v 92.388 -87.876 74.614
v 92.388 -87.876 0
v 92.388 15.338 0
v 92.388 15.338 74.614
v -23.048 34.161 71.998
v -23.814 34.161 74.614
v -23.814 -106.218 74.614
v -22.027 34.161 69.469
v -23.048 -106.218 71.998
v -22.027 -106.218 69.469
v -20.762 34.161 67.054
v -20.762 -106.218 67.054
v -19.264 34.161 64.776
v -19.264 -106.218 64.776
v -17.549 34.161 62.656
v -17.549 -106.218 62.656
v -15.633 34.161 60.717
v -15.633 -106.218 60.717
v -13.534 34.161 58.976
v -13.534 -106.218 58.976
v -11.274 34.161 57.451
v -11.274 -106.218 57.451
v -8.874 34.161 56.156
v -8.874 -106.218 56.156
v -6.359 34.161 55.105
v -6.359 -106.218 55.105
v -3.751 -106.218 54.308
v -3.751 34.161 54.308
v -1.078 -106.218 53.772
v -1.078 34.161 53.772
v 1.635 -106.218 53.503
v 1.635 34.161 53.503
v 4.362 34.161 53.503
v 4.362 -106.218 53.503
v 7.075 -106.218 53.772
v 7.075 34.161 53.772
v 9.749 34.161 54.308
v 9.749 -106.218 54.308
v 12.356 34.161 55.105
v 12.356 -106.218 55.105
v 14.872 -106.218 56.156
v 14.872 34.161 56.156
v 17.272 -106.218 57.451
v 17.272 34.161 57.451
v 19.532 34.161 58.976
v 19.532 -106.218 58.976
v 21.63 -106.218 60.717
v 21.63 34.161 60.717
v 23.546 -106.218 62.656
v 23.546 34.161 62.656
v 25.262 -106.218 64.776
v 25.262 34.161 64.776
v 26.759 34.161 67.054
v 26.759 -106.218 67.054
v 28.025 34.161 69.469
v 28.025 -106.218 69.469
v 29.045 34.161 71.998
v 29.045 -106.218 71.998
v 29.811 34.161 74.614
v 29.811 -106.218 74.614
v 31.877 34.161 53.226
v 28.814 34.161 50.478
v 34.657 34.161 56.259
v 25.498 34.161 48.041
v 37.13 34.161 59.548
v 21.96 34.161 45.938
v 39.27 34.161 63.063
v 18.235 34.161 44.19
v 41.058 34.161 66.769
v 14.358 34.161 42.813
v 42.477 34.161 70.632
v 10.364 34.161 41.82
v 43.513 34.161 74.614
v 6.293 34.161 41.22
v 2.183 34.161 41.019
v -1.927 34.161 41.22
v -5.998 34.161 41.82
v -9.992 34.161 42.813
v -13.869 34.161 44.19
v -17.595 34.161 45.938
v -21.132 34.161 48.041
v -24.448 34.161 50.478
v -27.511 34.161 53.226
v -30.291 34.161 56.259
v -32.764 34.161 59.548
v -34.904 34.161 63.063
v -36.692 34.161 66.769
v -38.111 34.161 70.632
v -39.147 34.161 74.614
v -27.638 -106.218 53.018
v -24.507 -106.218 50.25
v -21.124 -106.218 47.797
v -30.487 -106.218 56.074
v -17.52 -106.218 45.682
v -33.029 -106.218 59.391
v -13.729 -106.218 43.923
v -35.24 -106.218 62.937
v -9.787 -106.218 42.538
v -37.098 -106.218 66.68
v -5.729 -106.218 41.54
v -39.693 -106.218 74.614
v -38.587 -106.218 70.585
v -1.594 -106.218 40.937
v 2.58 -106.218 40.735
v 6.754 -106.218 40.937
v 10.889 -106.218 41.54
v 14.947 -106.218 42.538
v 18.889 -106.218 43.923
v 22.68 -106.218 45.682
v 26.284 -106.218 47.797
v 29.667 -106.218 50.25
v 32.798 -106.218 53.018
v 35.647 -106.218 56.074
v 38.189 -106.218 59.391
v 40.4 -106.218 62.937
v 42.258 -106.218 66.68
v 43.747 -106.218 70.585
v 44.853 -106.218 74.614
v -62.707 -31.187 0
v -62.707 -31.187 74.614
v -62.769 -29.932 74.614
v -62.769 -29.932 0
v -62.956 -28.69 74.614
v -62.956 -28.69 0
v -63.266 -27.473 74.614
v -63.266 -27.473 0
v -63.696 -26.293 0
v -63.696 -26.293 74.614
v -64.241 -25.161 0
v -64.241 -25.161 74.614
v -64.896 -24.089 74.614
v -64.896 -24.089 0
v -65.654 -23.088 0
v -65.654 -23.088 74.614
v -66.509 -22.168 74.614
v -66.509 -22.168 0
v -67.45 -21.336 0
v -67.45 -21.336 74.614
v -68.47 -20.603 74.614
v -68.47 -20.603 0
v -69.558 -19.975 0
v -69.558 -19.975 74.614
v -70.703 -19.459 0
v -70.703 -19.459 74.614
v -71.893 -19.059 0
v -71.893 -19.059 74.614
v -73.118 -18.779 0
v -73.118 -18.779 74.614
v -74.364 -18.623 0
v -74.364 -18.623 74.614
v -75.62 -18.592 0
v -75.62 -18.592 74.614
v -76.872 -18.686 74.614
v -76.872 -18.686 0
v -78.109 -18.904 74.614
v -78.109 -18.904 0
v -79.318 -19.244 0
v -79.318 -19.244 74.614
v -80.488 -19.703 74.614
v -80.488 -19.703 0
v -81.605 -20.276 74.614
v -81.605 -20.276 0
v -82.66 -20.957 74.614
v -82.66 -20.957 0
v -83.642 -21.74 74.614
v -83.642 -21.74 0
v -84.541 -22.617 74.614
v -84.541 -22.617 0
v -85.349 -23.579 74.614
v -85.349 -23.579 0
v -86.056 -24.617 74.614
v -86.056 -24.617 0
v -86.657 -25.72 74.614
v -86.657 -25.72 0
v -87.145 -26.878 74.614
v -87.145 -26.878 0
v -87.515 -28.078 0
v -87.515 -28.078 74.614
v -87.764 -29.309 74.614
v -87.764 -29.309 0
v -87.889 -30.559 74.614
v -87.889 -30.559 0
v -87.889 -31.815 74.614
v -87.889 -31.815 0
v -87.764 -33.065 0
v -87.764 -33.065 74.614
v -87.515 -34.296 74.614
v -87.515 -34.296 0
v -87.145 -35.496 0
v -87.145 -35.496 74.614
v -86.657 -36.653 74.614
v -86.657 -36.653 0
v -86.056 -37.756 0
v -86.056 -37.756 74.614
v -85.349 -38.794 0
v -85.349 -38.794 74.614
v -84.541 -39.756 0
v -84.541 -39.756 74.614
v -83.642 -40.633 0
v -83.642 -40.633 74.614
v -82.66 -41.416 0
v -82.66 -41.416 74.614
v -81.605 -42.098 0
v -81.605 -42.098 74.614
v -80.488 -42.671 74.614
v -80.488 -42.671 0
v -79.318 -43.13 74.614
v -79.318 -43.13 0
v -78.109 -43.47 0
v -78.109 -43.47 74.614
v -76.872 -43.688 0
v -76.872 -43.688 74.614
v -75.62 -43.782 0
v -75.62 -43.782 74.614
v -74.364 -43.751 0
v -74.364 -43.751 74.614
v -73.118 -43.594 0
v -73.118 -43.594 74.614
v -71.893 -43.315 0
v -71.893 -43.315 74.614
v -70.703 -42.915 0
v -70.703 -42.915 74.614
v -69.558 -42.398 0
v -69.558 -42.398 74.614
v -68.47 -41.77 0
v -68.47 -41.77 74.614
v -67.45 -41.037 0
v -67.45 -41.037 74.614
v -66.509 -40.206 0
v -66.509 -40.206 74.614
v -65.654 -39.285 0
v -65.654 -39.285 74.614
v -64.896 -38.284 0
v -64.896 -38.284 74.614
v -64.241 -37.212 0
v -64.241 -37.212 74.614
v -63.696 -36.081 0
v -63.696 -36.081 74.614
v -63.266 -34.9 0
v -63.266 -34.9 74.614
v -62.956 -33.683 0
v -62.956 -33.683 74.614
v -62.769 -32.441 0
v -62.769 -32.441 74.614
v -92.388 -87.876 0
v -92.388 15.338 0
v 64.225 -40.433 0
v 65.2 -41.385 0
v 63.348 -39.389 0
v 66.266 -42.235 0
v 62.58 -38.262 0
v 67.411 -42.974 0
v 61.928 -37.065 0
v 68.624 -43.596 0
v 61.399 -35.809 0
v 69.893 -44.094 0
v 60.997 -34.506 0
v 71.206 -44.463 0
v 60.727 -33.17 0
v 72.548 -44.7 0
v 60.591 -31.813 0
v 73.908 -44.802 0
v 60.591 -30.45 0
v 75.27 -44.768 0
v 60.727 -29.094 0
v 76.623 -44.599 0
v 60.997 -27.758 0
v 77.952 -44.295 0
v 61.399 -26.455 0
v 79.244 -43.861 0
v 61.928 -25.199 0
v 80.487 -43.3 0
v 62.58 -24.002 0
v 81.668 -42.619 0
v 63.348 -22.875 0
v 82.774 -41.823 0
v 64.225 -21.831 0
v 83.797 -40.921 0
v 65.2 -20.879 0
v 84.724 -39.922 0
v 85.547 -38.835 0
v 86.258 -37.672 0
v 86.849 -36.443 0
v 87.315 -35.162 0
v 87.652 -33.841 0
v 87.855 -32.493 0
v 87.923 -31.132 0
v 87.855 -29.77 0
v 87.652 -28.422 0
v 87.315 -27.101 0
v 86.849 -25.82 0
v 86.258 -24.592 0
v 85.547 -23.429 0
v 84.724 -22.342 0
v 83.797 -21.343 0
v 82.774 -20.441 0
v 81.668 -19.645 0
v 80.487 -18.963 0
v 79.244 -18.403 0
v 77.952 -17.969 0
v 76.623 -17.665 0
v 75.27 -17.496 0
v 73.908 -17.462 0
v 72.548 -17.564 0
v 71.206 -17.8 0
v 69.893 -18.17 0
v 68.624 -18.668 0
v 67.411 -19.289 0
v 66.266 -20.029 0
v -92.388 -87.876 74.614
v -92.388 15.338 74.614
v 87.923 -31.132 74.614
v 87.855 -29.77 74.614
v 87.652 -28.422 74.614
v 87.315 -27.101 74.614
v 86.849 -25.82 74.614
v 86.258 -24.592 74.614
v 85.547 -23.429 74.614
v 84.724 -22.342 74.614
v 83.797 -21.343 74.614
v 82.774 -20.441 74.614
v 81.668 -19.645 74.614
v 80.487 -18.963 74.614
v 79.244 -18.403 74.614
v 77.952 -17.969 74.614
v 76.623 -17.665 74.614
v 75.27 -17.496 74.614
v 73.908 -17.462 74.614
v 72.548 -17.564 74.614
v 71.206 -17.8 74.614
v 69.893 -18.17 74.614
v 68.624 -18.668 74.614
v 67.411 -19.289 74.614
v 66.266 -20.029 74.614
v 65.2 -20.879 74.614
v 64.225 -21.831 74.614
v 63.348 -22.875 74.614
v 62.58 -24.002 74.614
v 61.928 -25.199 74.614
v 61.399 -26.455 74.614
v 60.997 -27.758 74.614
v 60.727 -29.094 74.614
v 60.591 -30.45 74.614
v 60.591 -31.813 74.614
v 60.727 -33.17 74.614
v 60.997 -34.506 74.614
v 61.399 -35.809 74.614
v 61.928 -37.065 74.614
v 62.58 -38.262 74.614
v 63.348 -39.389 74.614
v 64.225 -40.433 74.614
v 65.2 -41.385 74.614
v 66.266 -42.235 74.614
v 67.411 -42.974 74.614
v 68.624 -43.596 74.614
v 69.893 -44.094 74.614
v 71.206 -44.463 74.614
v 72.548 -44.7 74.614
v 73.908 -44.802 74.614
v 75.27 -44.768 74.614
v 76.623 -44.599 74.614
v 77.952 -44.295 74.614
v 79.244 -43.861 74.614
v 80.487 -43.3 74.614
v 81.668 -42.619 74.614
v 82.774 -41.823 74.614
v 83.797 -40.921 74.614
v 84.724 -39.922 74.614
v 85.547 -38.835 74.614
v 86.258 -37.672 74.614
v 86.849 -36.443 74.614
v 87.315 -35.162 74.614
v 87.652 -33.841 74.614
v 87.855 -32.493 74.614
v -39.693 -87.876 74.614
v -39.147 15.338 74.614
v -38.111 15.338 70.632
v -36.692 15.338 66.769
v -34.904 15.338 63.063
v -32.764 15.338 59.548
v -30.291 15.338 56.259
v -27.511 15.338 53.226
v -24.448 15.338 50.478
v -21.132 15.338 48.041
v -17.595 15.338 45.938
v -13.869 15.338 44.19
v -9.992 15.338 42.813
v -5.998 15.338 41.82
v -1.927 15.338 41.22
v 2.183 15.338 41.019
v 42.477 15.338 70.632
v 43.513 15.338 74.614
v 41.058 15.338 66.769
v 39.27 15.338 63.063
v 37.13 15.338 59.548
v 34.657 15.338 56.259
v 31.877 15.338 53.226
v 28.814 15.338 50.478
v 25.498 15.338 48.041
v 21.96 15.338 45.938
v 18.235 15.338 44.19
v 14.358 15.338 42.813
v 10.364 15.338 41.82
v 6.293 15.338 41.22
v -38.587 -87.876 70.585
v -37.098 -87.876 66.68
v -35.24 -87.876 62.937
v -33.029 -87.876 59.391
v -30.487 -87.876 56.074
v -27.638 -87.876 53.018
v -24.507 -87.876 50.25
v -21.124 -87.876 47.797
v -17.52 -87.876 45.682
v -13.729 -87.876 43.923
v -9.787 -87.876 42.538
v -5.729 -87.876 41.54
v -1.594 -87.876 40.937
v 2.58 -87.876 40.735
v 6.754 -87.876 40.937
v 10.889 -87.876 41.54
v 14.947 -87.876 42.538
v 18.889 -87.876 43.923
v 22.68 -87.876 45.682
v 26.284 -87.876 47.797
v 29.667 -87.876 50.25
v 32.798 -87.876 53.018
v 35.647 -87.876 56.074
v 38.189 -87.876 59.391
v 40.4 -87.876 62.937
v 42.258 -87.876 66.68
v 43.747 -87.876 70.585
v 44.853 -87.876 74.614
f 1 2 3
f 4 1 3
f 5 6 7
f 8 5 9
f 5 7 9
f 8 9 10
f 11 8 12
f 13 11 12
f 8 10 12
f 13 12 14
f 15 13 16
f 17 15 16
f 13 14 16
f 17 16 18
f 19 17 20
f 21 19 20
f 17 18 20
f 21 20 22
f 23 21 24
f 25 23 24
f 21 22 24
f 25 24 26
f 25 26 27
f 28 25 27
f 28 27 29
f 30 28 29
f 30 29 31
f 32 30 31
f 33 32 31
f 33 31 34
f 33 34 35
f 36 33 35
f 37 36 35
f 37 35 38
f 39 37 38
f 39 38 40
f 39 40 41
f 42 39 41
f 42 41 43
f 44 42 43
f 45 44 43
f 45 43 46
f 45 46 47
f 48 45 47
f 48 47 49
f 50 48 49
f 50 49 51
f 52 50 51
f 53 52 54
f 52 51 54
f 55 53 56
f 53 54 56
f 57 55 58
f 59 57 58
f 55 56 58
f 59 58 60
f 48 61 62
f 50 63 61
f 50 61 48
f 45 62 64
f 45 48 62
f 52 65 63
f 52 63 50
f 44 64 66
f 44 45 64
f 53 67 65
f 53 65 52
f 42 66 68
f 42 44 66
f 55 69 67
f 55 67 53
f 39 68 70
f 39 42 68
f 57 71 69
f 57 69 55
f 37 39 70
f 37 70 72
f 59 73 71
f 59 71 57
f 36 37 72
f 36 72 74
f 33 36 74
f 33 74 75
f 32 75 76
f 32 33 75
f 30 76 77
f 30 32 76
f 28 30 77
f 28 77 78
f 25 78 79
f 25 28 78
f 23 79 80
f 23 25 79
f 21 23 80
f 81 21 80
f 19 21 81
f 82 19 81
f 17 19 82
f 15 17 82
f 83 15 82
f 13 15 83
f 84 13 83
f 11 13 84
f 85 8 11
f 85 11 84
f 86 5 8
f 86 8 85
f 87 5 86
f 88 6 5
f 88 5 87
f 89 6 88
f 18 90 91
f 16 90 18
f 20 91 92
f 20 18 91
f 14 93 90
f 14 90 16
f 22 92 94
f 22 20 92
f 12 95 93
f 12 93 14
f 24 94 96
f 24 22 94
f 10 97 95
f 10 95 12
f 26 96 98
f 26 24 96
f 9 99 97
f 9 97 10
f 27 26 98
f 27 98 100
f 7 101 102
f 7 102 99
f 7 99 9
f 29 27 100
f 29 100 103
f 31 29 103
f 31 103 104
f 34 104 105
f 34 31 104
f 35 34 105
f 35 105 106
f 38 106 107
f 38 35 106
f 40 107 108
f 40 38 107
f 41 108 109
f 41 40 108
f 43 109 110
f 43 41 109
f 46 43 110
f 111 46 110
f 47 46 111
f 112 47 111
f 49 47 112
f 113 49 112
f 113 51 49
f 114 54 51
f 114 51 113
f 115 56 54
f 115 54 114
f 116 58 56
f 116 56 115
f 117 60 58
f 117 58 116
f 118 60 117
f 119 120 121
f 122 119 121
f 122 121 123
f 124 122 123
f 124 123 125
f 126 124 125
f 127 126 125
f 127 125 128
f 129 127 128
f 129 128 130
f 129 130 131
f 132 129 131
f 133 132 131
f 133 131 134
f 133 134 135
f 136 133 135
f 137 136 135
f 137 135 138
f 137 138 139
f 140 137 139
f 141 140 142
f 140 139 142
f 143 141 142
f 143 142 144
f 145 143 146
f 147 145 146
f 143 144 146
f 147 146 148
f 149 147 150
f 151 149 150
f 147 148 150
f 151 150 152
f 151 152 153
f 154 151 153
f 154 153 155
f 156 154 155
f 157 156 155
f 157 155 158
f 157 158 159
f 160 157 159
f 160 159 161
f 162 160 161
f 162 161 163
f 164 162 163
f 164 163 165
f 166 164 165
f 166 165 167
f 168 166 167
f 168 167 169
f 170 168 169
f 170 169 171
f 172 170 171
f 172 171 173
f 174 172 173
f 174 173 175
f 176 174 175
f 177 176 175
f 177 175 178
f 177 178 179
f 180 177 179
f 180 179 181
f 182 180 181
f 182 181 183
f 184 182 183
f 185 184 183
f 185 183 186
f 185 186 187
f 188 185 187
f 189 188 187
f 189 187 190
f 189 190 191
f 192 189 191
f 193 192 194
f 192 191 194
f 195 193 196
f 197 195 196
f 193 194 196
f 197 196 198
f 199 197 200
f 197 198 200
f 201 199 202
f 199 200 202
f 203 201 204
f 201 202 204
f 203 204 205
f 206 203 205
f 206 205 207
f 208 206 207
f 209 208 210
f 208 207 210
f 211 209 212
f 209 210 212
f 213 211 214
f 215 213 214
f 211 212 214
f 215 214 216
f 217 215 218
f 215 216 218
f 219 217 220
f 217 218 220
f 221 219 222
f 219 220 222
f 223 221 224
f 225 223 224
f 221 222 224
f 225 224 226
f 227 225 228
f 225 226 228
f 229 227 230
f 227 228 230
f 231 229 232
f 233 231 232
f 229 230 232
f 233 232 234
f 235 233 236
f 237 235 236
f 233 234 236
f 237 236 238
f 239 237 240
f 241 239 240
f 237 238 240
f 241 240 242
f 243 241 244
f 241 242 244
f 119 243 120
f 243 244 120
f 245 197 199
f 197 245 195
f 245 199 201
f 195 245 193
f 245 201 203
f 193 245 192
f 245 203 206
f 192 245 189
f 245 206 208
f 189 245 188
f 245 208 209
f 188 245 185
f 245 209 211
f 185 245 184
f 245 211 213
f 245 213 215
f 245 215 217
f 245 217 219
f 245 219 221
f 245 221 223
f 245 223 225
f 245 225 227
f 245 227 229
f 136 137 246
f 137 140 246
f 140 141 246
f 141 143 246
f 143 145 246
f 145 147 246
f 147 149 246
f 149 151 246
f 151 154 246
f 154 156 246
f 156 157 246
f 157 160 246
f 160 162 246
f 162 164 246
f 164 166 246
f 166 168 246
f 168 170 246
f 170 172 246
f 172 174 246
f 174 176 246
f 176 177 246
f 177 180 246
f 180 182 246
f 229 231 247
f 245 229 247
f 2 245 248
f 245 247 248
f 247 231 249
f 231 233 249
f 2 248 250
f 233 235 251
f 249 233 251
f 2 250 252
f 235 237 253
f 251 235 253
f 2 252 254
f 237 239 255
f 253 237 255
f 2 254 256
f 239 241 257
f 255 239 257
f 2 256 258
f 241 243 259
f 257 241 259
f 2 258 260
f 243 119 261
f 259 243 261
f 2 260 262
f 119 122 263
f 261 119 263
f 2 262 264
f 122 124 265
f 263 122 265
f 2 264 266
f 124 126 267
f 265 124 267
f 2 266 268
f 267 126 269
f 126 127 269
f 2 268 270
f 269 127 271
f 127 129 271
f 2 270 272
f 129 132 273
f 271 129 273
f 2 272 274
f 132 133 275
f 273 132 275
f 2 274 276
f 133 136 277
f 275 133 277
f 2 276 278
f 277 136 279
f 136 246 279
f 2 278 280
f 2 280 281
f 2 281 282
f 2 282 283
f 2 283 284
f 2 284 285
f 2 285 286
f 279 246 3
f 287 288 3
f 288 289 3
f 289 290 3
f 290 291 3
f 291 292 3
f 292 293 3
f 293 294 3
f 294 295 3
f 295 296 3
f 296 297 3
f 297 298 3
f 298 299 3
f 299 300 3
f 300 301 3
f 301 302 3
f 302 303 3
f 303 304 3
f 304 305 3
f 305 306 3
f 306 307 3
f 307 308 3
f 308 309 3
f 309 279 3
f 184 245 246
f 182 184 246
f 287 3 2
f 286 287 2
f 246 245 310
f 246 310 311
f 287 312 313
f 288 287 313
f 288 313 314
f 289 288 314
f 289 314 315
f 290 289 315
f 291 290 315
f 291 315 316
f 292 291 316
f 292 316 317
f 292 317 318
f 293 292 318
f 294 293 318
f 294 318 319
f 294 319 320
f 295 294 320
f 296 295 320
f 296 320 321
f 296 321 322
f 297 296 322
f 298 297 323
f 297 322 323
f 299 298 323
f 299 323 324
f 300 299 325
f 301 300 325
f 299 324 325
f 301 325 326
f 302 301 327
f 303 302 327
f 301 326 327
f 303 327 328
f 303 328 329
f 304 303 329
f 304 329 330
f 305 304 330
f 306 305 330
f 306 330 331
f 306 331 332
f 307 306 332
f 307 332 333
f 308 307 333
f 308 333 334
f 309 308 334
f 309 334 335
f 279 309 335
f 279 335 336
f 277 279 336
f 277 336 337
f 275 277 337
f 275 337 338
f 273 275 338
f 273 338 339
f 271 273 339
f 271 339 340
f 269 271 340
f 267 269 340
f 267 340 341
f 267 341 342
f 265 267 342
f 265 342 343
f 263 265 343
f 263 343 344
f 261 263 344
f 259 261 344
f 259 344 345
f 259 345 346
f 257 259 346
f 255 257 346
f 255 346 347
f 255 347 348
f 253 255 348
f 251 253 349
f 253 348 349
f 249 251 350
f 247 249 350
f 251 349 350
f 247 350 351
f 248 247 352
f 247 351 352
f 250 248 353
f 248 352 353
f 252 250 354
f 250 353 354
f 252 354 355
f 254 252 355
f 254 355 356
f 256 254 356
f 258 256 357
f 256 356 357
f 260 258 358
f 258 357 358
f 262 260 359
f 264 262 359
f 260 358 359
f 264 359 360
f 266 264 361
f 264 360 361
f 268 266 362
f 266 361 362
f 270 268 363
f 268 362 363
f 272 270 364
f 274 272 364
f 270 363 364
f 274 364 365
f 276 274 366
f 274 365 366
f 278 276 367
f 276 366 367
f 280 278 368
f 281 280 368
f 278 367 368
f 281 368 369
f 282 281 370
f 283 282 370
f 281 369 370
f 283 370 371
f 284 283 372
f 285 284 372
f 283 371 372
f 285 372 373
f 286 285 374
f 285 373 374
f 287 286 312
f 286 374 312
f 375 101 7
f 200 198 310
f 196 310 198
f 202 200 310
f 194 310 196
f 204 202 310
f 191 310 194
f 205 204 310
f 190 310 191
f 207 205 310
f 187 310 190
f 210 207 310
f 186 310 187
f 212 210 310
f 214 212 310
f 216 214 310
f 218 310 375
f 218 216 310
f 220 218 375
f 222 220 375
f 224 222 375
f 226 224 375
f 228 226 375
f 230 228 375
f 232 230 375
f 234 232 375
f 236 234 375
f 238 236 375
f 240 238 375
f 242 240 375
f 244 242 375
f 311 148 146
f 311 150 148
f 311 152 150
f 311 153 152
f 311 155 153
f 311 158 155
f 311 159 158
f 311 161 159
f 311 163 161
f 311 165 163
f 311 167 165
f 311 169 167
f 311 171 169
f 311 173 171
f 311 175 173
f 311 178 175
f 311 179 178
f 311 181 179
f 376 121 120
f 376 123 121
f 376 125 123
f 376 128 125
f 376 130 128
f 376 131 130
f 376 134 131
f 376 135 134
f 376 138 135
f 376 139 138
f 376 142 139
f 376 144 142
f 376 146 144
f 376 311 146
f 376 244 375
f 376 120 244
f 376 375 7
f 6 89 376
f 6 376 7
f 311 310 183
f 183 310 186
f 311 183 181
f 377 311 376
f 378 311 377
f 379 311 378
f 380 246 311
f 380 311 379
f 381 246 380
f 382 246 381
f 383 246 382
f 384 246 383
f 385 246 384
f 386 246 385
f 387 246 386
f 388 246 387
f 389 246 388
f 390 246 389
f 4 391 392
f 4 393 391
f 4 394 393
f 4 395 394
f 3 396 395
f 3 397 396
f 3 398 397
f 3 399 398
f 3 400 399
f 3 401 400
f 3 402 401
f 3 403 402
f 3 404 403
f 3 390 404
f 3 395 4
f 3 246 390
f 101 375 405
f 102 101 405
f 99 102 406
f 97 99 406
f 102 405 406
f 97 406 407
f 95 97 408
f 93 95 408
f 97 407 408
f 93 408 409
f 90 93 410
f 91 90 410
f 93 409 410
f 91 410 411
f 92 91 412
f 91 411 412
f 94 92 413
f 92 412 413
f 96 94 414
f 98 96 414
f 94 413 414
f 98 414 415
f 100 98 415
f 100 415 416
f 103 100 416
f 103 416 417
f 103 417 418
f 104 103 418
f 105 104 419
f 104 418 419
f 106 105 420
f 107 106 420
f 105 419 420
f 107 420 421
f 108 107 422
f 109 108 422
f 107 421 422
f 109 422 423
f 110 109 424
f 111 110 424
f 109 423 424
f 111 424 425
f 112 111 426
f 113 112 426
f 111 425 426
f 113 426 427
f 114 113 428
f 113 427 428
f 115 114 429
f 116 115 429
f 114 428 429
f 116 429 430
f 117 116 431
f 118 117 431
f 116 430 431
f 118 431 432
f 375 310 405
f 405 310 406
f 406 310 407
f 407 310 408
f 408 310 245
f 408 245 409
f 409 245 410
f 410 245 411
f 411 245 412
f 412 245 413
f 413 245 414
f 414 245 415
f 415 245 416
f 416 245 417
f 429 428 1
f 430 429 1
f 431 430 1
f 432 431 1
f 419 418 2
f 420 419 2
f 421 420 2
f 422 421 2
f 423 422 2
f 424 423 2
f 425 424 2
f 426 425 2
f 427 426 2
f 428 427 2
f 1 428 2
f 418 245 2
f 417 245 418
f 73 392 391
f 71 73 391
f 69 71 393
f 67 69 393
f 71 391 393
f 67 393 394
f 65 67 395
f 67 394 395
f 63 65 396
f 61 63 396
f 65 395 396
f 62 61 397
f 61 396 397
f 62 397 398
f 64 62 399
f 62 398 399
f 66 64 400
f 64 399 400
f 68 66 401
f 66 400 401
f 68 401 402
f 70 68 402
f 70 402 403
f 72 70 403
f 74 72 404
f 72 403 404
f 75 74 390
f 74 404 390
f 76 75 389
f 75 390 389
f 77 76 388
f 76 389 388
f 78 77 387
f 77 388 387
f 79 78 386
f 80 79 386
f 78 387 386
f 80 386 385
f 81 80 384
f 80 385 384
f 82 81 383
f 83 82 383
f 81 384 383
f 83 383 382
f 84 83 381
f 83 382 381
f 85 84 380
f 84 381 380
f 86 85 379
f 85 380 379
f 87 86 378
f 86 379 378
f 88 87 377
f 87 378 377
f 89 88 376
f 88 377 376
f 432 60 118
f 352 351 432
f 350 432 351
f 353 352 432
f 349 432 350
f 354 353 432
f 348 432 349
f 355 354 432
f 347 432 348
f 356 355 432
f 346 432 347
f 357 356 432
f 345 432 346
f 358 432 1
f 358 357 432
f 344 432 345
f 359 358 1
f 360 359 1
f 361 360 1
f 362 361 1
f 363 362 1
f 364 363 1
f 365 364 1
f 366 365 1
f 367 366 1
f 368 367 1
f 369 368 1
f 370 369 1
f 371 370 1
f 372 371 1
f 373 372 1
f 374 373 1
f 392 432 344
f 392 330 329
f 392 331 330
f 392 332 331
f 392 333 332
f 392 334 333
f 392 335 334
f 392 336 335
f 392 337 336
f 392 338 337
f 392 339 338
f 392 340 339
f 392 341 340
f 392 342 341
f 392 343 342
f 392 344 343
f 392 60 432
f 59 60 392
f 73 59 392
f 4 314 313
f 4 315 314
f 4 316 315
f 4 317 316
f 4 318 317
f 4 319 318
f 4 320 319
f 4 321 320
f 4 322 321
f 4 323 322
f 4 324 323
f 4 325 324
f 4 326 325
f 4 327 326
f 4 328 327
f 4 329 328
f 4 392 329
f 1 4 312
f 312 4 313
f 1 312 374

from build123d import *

# Parameters (mm, degrees)
F0_W      = 184.7751736641
F0_H      = 103.2142341137
F1_DEPTH  = 74.6144801378
F3_DEPTH  = 18.3417294174
F5_DEPTH  = 18.8233163208
F7_DEPTH  = 140.3802798519
F8_R      = 12.5990656268
F9_DEPTH  = 74.6154801378
F10_R     = 13.6743893785
F11_DEPTH = 74.6154801378


with BuildPart() as f1:
    # F0 (on Top) → F1 (new body)
    with BuildSketch(Plane.XY):
        with Locations((0, -36.26935184)):
            Rectangle(F0_W, F0_H)
    extrude(amount=F1_DEPTH)

    # F2 (on face) → F3 (join)
    with BuildSketch(Plane.XZ.offset(87.8764688969)):
        with BuildLine():
            Line((44.8529869318, 74.6144801378), (-39.6928861737, 74.6144801378))
            ThreePointArc((-39.6928861737, 74.6144801378), (2.580050379, 40.7354876043), (44.8529869318, 74.6144801378))
        make_face()
    extrude(amount=F3_DEPTH)

    # F4 (on face) → F5 (join)
    with BuildSketch(Plane(origin=(0, 15.3377652168, 0), x_dir=(-1, 0, 0), z_dir=(0, 1, 0))):
        with BuildLine():
            Line((39.1467735171, 74.6144801378), (-43.5126498342, 74.6144801378))
            ThreePointArc((-43.5126498342, 74.6144801378), (-2.1829381585, 41.0193828263), (39.1467735171, 74.6144801378))
        make_face()
    extrude(amount=F5_DEPTH)

    # F6 (on face) → F7 (cut, through all)
    with BuildSketch(Plane.XZ.offset(106.2181983143)):
        with BuildLine():
            Line((29.8108495772, 74.6144801378), (-23.8135512918, 74.6144801378))
            ThreePointArc((-23.8135512918, 74.6144801378), (2.9986491427, 53.4687918706), (29.8108495772, 74.6144801378))
        make_face()
    extrude(amount=-F7_DEPTH, mode=Mode.SUBTRACT)

    # F8 (on face) → F9 (cut, through all)
    with BuildSketch(Plane.XY.offset(74.6144801378)):
        with Locations((-75.3057301044, -31.1868041754)):
            Circle(F8_R)
    extrude(amount=-F9_DEPTH, mode=Mode.SUBTRACT)

    # F10 (on face) → F11 (cut, through all)
    with BuildSketch(Plane.XY.offset(74.6144801378)):
        with Locations((74.2485821247, -31.1318598688)):
            Circle(F10_R)
    extrude(amount=-F11_DEPTH, mode=Mode.SUBTRACT)


solid = f1.part
